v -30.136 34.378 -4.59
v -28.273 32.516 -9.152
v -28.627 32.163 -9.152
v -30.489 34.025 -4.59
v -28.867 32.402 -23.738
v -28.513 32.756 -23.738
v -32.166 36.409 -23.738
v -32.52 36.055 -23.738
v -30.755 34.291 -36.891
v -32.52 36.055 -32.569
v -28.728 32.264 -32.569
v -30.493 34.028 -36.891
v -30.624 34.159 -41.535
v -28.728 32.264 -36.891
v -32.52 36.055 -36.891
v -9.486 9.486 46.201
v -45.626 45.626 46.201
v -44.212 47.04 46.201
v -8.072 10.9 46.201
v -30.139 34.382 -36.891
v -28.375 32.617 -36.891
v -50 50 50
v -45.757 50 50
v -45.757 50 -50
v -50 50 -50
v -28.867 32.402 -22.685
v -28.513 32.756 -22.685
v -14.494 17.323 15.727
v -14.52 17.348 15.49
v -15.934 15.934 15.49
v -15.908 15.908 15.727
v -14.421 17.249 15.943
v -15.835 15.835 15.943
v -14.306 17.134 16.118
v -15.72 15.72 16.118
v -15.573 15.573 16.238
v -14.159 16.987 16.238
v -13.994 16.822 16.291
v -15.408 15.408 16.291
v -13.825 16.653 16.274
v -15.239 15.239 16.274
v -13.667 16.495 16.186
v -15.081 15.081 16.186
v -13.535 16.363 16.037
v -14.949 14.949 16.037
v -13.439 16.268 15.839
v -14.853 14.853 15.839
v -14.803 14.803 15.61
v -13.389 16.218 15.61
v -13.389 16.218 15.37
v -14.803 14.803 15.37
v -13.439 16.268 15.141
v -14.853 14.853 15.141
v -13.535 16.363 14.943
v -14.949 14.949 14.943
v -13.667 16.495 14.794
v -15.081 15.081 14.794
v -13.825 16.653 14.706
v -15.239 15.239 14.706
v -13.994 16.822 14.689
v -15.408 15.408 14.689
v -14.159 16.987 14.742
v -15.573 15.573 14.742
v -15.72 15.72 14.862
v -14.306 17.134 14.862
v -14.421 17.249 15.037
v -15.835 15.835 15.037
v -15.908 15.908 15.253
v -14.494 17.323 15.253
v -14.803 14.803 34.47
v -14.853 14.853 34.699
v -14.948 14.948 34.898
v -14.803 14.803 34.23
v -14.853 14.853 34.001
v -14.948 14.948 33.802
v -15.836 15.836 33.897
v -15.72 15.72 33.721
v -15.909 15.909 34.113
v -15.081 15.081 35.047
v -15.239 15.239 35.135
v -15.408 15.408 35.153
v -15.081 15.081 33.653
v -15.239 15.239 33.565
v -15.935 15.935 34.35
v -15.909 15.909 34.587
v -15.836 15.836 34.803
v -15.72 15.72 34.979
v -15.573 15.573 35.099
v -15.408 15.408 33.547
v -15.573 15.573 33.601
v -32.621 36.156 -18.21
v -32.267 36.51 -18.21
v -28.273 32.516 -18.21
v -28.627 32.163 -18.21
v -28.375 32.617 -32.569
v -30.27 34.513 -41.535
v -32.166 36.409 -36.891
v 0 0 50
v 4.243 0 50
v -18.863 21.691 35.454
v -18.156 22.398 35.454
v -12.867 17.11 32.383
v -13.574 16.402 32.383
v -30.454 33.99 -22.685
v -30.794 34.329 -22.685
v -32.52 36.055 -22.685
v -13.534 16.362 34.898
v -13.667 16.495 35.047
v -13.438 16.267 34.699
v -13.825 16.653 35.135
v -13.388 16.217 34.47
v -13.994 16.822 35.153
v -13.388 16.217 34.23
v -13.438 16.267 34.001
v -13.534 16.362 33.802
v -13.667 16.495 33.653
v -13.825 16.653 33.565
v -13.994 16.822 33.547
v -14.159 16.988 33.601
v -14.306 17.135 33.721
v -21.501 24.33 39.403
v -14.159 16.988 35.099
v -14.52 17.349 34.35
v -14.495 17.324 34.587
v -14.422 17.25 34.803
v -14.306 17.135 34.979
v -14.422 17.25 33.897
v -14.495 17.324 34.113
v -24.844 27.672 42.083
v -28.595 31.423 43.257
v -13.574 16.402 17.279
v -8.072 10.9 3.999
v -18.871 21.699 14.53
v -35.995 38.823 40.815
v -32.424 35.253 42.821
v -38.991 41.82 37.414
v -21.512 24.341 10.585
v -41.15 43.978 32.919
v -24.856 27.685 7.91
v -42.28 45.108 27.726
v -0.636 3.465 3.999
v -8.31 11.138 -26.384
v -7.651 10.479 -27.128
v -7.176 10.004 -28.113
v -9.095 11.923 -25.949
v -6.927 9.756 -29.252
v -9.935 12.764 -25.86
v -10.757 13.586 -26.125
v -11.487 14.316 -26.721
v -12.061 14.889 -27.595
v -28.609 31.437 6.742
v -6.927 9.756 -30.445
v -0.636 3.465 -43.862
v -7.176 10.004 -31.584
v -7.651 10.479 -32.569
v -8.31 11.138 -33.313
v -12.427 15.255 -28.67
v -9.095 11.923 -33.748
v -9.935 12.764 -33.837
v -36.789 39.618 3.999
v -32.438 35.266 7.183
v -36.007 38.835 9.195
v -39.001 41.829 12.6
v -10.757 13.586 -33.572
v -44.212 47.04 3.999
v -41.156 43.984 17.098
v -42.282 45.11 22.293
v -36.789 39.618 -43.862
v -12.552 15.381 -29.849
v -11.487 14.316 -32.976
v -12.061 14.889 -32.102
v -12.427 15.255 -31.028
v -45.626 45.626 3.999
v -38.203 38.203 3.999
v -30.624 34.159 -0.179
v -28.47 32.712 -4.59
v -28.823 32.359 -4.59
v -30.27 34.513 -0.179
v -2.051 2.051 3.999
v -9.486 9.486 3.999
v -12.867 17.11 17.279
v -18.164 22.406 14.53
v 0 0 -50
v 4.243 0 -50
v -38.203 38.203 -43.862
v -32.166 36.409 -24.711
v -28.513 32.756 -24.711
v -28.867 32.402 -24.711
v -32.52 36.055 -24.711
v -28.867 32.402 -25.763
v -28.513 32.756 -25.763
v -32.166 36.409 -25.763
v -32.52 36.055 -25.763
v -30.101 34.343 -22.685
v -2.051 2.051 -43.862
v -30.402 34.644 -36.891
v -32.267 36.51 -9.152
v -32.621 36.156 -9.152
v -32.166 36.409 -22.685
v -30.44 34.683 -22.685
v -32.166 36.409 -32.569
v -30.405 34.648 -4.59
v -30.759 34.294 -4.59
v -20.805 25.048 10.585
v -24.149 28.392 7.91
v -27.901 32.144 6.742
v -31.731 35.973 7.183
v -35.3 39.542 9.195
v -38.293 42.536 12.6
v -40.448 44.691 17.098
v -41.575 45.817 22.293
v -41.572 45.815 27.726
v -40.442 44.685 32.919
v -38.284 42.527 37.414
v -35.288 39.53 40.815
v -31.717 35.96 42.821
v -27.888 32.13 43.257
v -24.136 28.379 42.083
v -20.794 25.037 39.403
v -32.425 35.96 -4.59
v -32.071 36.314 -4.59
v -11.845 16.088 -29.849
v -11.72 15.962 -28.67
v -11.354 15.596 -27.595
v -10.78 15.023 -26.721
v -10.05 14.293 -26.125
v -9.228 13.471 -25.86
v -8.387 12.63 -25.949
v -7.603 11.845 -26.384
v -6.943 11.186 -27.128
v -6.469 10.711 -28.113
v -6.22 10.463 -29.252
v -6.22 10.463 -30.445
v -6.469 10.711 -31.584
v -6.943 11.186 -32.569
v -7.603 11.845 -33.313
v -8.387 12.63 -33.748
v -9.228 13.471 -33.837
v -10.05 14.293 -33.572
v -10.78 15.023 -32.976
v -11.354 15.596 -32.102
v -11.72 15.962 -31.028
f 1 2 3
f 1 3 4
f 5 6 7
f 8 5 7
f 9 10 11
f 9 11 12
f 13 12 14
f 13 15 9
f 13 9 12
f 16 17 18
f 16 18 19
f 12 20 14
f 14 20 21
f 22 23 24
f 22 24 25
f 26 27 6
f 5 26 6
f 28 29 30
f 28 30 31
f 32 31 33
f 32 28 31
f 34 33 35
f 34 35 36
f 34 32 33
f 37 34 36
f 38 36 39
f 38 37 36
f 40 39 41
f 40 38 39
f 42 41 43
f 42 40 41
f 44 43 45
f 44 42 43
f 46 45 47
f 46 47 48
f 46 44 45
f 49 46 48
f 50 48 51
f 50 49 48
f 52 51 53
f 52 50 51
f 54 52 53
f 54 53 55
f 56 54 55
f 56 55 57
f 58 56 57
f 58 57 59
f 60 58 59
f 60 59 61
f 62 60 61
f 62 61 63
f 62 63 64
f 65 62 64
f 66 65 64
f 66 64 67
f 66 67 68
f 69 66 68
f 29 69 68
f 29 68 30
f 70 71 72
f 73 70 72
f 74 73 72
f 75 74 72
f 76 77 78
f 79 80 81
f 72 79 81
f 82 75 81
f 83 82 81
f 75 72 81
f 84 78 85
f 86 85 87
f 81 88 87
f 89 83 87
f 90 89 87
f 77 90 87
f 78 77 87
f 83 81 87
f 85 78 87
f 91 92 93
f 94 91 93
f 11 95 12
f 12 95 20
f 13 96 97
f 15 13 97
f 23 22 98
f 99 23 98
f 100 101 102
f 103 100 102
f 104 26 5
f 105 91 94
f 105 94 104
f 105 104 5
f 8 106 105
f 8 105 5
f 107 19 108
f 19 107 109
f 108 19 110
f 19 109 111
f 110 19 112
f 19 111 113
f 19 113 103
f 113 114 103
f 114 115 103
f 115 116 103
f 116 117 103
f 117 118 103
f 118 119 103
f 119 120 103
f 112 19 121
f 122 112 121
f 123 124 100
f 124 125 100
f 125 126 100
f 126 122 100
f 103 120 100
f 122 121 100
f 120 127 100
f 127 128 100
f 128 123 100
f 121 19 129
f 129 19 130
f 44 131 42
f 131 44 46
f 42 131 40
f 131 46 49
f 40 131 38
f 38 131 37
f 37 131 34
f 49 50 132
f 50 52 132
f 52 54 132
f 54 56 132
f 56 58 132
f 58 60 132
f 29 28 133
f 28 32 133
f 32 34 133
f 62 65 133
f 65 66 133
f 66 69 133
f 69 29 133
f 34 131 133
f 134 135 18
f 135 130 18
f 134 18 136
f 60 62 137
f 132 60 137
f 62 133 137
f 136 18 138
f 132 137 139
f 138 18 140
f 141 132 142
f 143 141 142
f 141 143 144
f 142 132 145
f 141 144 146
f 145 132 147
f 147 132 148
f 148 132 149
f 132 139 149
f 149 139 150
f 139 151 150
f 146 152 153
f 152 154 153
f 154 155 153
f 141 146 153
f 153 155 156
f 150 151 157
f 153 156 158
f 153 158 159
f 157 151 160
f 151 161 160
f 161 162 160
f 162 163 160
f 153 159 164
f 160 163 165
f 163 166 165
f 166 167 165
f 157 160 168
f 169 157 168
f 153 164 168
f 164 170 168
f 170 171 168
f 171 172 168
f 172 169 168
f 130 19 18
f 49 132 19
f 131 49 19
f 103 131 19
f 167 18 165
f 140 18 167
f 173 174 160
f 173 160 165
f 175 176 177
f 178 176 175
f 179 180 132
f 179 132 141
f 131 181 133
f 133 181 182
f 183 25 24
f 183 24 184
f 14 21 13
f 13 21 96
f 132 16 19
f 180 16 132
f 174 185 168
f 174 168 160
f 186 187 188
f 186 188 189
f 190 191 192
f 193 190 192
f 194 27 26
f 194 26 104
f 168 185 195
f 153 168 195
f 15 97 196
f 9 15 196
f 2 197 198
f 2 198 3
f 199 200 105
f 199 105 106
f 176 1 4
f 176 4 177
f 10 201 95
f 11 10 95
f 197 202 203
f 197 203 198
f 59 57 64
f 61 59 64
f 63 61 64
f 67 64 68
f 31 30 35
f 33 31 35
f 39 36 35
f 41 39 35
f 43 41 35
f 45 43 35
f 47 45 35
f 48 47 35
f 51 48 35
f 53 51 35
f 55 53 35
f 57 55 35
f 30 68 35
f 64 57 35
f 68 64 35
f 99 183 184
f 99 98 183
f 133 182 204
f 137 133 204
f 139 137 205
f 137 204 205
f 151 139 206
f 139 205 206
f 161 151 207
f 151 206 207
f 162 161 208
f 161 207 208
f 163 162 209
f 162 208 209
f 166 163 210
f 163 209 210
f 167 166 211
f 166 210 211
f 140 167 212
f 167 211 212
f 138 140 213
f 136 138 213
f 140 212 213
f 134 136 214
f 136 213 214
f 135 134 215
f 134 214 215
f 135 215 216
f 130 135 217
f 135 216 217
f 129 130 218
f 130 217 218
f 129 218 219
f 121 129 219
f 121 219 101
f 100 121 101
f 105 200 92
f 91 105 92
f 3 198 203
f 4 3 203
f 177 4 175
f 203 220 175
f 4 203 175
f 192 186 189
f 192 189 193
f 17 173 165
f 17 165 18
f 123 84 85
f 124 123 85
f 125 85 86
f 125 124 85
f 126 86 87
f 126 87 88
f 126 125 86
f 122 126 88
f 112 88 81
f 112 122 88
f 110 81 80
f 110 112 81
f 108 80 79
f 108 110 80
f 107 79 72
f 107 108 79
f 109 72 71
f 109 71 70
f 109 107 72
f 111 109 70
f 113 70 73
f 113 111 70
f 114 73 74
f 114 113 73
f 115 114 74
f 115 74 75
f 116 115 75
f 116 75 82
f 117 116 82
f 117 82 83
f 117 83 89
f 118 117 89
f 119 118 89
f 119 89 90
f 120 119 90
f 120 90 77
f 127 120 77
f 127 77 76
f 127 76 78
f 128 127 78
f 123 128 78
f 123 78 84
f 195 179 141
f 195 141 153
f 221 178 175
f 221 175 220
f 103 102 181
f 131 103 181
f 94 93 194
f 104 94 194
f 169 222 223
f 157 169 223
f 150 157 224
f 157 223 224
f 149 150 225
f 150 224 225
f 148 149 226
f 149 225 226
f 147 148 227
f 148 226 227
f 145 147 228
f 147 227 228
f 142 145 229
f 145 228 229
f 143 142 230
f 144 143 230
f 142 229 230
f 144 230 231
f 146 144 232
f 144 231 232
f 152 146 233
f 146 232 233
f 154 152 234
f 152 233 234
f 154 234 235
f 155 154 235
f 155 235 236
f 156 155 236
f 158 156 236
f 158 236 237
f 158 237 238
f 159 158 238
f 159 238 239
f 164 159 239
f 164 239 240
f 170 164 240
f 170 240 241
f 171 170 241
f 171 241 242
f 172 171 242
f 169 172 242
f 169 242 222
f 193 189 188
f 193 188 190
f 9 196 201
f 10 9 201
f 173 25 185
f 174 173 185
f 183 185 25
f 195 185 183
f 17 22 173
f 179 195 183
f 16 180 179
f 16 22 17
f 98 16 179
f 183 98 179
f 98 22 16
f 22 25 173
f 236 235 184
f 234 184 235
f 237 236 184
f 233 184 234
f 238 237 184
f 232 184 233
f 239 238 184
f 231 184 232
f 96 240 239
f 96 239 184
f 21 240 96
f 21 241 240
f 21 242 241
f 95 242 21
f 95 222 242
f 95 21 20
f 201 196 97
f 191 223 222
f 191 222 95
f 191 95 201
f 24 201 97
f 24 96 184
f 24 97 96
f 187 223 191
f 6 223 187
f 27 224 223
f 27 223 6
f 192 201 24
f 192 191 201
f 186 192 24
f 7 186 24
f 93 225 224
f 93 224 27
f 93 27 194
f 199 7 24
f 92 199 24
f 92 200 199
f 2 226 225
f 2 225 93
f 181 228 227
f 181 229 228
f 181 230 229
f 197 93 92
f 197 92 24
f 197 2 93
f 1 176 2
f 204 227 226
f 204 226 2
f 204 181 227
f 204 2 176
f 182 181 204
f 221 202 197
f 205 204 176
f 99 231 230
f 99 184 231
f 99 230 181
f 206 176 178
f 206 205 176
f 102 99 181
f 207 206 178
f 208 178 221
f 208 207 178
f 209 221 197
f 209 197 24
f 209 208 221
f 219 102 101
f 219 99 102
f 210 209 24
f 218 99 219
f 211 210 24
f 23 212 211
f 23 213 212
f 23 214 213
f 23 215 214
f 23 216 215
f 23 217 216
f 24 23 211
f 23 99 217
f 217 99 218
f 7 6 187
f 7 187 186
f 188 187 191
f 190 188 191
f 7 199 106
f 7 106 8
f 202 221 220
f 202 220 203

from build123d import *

# Parameters (mm, degrees)
BOSS_EXTRUDE1_DEPTH = 50
CUT_EXTRUDE1_DEPTH  = 10
SKETCH3_R           = 4
CUT_EXTRUDE2_DEPTH  = 10
SKETCH4_W           = 1.052304973
SKETCH4_H           = 5.165860775
CUT_EXTRUDE6_DEPTH  = 0.5
CUT_EXTRUDE7_DEPTH  = 2
SKETCH6_R           = 0.804992829
SKETCH6_R_2         = 0.803708801
BOSS_EXTRUDE2_DEPTH = 3


with BuildPart() as part:
    # Sketch1 → Boss-Extrude1 (new, symmetric)
    with BuildSketch(Plane.XY):
        Polygon((0, 0), (4.242640687, 0), (-45.757359313, 50), (-50, 50), align=None)
    extrude(amount=BOSS_EXTRUDE1_DEPTH, both=True)

    # Sketch2 → Cut-Extrude1 (cut)
    with BuildSketch(Plane(origin=(2.121320344, 2.121320344, 0), x_dir=(0, 0, -1), z_dir=(0.7071067811865487, 0.7071067811865465, 0))):
        with BuildLine():
            Line((-32.383146044, 21.19659939), (-17.279022802, 21.19659939))
            Line((-17.279022802, 21.19659939), (-14.530403118, 28.687350871))
            ThreePointArc((-14.530403118, 28.687350871), (-25.009728549, 61.996596804), (-35.453632693, 28.676227773))
            Line((-35.453632693, 28.676227773), (-32.383146044, 21.19659939))
        make_face()
    extrude(amount=-CUT_EXTRUDE1_DEPTH, mode=Mode.SUBTRACT)

    # Sketch3 → Cut-Extrude2 (cut)
    with BuildSketch(Plane(origin=(2.121320344, 2.121320344, 0), x_dir=(0, 0, -1), z_dir=(0.7071067811865487, 0.7071067811865465, 0))):
        with Locations(Location((29.848579643, 15.751722073, 0), (0, 0, 90))):
            Circle(SKETCH3_R)
    extrude(amount=-CUT_EXTRUDE2_DEPTH, mode=Mode.SUBTRACT)

    # Sketch4 → Cut-Extrude6 (cut)
    with BuildSketch(Plane(origin=(2.121320344, 2.121320344, 0), x_dir=(0, 0, -1), z_dir=(0.7071067811865488, 0.7071067811865462, 0))):
        Polygon((18.209716016, 48.632673253), (18.209716016, 42.984750661), (23.10096046, 45.808711957), align=None)
        with Locations((23.211533522, 45.906886197)):
            Rectangle(SKETCH4_W, SKETCH4_H)
        with Locations((25.236963378, 45.906886197)):
            Rectangle(SKETCH4_W, SKETCH4_H)
        Polygon((32.568799155, 48.489816584), (32.568799155, 43.12760733), (37.212608589, 45.808711957), align=None)
        Polygon((36.890986923, 48.489816584), (36.890986923, 43.12760733), (41.534796358, 45.808711957), align=None)
        Polygon((9.151606642, 48.632673253), (9.151606642, 42.984750661), (4.260362198, 45.808711957), align=None)
        Polygon((4.590275544, 48.355357963), (4.590275544, 43.262065951), (0.179355272, 45.808711957), align=None)
    extrude(amount=-CUT_EXTRUDE6_DEPTH, mode=Mode.SUBTRACT)

    # Sketch5 → Cut-Extrude7 (cut)
    with BuildSketch(Plane(origin=(0, 0, 0), x_dir=(0, 0, 1), z_dir=(-0.7071067811865488, -0.7071067811865462, 0))):
        Polygon((46.201031171, 64.525111683), (46.201031171, 13.41528861), (3.998852775, 13.41528861), (3.998852775, 2.899934094), (-43.862101498, 2.899934094), (-43.862101498, 38.281153906), (-43.862101498, 54.027620673), (3.998852775, 54.027620673), (3.998852775, 64.525111683), align=None)
    extrude(amount=-CUT_EXTRUDE7_DEPTH, mode=Mode.SUBTRACT)

    # Sketch6 → Boss-Extrude2 (add)
    with BuildSketch(Plane(origin=(2.121320344, 2.121320344, 0), x_dir=(0, 0, -1), z_dir=(0.7071067811865488, 0.7071067811865462, 0))):
        with Locations(Location((-34.35, 21.73, 0), (0, 0, 90))):
            Circle(SKETCH6_R)
        with Locations(Location((-15.49, 21.73, 0), (0, 0, 90))):
            Circle(SKETCH6_R_2)
    extrude(amount=-BOSS_EXTRUDE2_DEPTH)


solid = part.part
